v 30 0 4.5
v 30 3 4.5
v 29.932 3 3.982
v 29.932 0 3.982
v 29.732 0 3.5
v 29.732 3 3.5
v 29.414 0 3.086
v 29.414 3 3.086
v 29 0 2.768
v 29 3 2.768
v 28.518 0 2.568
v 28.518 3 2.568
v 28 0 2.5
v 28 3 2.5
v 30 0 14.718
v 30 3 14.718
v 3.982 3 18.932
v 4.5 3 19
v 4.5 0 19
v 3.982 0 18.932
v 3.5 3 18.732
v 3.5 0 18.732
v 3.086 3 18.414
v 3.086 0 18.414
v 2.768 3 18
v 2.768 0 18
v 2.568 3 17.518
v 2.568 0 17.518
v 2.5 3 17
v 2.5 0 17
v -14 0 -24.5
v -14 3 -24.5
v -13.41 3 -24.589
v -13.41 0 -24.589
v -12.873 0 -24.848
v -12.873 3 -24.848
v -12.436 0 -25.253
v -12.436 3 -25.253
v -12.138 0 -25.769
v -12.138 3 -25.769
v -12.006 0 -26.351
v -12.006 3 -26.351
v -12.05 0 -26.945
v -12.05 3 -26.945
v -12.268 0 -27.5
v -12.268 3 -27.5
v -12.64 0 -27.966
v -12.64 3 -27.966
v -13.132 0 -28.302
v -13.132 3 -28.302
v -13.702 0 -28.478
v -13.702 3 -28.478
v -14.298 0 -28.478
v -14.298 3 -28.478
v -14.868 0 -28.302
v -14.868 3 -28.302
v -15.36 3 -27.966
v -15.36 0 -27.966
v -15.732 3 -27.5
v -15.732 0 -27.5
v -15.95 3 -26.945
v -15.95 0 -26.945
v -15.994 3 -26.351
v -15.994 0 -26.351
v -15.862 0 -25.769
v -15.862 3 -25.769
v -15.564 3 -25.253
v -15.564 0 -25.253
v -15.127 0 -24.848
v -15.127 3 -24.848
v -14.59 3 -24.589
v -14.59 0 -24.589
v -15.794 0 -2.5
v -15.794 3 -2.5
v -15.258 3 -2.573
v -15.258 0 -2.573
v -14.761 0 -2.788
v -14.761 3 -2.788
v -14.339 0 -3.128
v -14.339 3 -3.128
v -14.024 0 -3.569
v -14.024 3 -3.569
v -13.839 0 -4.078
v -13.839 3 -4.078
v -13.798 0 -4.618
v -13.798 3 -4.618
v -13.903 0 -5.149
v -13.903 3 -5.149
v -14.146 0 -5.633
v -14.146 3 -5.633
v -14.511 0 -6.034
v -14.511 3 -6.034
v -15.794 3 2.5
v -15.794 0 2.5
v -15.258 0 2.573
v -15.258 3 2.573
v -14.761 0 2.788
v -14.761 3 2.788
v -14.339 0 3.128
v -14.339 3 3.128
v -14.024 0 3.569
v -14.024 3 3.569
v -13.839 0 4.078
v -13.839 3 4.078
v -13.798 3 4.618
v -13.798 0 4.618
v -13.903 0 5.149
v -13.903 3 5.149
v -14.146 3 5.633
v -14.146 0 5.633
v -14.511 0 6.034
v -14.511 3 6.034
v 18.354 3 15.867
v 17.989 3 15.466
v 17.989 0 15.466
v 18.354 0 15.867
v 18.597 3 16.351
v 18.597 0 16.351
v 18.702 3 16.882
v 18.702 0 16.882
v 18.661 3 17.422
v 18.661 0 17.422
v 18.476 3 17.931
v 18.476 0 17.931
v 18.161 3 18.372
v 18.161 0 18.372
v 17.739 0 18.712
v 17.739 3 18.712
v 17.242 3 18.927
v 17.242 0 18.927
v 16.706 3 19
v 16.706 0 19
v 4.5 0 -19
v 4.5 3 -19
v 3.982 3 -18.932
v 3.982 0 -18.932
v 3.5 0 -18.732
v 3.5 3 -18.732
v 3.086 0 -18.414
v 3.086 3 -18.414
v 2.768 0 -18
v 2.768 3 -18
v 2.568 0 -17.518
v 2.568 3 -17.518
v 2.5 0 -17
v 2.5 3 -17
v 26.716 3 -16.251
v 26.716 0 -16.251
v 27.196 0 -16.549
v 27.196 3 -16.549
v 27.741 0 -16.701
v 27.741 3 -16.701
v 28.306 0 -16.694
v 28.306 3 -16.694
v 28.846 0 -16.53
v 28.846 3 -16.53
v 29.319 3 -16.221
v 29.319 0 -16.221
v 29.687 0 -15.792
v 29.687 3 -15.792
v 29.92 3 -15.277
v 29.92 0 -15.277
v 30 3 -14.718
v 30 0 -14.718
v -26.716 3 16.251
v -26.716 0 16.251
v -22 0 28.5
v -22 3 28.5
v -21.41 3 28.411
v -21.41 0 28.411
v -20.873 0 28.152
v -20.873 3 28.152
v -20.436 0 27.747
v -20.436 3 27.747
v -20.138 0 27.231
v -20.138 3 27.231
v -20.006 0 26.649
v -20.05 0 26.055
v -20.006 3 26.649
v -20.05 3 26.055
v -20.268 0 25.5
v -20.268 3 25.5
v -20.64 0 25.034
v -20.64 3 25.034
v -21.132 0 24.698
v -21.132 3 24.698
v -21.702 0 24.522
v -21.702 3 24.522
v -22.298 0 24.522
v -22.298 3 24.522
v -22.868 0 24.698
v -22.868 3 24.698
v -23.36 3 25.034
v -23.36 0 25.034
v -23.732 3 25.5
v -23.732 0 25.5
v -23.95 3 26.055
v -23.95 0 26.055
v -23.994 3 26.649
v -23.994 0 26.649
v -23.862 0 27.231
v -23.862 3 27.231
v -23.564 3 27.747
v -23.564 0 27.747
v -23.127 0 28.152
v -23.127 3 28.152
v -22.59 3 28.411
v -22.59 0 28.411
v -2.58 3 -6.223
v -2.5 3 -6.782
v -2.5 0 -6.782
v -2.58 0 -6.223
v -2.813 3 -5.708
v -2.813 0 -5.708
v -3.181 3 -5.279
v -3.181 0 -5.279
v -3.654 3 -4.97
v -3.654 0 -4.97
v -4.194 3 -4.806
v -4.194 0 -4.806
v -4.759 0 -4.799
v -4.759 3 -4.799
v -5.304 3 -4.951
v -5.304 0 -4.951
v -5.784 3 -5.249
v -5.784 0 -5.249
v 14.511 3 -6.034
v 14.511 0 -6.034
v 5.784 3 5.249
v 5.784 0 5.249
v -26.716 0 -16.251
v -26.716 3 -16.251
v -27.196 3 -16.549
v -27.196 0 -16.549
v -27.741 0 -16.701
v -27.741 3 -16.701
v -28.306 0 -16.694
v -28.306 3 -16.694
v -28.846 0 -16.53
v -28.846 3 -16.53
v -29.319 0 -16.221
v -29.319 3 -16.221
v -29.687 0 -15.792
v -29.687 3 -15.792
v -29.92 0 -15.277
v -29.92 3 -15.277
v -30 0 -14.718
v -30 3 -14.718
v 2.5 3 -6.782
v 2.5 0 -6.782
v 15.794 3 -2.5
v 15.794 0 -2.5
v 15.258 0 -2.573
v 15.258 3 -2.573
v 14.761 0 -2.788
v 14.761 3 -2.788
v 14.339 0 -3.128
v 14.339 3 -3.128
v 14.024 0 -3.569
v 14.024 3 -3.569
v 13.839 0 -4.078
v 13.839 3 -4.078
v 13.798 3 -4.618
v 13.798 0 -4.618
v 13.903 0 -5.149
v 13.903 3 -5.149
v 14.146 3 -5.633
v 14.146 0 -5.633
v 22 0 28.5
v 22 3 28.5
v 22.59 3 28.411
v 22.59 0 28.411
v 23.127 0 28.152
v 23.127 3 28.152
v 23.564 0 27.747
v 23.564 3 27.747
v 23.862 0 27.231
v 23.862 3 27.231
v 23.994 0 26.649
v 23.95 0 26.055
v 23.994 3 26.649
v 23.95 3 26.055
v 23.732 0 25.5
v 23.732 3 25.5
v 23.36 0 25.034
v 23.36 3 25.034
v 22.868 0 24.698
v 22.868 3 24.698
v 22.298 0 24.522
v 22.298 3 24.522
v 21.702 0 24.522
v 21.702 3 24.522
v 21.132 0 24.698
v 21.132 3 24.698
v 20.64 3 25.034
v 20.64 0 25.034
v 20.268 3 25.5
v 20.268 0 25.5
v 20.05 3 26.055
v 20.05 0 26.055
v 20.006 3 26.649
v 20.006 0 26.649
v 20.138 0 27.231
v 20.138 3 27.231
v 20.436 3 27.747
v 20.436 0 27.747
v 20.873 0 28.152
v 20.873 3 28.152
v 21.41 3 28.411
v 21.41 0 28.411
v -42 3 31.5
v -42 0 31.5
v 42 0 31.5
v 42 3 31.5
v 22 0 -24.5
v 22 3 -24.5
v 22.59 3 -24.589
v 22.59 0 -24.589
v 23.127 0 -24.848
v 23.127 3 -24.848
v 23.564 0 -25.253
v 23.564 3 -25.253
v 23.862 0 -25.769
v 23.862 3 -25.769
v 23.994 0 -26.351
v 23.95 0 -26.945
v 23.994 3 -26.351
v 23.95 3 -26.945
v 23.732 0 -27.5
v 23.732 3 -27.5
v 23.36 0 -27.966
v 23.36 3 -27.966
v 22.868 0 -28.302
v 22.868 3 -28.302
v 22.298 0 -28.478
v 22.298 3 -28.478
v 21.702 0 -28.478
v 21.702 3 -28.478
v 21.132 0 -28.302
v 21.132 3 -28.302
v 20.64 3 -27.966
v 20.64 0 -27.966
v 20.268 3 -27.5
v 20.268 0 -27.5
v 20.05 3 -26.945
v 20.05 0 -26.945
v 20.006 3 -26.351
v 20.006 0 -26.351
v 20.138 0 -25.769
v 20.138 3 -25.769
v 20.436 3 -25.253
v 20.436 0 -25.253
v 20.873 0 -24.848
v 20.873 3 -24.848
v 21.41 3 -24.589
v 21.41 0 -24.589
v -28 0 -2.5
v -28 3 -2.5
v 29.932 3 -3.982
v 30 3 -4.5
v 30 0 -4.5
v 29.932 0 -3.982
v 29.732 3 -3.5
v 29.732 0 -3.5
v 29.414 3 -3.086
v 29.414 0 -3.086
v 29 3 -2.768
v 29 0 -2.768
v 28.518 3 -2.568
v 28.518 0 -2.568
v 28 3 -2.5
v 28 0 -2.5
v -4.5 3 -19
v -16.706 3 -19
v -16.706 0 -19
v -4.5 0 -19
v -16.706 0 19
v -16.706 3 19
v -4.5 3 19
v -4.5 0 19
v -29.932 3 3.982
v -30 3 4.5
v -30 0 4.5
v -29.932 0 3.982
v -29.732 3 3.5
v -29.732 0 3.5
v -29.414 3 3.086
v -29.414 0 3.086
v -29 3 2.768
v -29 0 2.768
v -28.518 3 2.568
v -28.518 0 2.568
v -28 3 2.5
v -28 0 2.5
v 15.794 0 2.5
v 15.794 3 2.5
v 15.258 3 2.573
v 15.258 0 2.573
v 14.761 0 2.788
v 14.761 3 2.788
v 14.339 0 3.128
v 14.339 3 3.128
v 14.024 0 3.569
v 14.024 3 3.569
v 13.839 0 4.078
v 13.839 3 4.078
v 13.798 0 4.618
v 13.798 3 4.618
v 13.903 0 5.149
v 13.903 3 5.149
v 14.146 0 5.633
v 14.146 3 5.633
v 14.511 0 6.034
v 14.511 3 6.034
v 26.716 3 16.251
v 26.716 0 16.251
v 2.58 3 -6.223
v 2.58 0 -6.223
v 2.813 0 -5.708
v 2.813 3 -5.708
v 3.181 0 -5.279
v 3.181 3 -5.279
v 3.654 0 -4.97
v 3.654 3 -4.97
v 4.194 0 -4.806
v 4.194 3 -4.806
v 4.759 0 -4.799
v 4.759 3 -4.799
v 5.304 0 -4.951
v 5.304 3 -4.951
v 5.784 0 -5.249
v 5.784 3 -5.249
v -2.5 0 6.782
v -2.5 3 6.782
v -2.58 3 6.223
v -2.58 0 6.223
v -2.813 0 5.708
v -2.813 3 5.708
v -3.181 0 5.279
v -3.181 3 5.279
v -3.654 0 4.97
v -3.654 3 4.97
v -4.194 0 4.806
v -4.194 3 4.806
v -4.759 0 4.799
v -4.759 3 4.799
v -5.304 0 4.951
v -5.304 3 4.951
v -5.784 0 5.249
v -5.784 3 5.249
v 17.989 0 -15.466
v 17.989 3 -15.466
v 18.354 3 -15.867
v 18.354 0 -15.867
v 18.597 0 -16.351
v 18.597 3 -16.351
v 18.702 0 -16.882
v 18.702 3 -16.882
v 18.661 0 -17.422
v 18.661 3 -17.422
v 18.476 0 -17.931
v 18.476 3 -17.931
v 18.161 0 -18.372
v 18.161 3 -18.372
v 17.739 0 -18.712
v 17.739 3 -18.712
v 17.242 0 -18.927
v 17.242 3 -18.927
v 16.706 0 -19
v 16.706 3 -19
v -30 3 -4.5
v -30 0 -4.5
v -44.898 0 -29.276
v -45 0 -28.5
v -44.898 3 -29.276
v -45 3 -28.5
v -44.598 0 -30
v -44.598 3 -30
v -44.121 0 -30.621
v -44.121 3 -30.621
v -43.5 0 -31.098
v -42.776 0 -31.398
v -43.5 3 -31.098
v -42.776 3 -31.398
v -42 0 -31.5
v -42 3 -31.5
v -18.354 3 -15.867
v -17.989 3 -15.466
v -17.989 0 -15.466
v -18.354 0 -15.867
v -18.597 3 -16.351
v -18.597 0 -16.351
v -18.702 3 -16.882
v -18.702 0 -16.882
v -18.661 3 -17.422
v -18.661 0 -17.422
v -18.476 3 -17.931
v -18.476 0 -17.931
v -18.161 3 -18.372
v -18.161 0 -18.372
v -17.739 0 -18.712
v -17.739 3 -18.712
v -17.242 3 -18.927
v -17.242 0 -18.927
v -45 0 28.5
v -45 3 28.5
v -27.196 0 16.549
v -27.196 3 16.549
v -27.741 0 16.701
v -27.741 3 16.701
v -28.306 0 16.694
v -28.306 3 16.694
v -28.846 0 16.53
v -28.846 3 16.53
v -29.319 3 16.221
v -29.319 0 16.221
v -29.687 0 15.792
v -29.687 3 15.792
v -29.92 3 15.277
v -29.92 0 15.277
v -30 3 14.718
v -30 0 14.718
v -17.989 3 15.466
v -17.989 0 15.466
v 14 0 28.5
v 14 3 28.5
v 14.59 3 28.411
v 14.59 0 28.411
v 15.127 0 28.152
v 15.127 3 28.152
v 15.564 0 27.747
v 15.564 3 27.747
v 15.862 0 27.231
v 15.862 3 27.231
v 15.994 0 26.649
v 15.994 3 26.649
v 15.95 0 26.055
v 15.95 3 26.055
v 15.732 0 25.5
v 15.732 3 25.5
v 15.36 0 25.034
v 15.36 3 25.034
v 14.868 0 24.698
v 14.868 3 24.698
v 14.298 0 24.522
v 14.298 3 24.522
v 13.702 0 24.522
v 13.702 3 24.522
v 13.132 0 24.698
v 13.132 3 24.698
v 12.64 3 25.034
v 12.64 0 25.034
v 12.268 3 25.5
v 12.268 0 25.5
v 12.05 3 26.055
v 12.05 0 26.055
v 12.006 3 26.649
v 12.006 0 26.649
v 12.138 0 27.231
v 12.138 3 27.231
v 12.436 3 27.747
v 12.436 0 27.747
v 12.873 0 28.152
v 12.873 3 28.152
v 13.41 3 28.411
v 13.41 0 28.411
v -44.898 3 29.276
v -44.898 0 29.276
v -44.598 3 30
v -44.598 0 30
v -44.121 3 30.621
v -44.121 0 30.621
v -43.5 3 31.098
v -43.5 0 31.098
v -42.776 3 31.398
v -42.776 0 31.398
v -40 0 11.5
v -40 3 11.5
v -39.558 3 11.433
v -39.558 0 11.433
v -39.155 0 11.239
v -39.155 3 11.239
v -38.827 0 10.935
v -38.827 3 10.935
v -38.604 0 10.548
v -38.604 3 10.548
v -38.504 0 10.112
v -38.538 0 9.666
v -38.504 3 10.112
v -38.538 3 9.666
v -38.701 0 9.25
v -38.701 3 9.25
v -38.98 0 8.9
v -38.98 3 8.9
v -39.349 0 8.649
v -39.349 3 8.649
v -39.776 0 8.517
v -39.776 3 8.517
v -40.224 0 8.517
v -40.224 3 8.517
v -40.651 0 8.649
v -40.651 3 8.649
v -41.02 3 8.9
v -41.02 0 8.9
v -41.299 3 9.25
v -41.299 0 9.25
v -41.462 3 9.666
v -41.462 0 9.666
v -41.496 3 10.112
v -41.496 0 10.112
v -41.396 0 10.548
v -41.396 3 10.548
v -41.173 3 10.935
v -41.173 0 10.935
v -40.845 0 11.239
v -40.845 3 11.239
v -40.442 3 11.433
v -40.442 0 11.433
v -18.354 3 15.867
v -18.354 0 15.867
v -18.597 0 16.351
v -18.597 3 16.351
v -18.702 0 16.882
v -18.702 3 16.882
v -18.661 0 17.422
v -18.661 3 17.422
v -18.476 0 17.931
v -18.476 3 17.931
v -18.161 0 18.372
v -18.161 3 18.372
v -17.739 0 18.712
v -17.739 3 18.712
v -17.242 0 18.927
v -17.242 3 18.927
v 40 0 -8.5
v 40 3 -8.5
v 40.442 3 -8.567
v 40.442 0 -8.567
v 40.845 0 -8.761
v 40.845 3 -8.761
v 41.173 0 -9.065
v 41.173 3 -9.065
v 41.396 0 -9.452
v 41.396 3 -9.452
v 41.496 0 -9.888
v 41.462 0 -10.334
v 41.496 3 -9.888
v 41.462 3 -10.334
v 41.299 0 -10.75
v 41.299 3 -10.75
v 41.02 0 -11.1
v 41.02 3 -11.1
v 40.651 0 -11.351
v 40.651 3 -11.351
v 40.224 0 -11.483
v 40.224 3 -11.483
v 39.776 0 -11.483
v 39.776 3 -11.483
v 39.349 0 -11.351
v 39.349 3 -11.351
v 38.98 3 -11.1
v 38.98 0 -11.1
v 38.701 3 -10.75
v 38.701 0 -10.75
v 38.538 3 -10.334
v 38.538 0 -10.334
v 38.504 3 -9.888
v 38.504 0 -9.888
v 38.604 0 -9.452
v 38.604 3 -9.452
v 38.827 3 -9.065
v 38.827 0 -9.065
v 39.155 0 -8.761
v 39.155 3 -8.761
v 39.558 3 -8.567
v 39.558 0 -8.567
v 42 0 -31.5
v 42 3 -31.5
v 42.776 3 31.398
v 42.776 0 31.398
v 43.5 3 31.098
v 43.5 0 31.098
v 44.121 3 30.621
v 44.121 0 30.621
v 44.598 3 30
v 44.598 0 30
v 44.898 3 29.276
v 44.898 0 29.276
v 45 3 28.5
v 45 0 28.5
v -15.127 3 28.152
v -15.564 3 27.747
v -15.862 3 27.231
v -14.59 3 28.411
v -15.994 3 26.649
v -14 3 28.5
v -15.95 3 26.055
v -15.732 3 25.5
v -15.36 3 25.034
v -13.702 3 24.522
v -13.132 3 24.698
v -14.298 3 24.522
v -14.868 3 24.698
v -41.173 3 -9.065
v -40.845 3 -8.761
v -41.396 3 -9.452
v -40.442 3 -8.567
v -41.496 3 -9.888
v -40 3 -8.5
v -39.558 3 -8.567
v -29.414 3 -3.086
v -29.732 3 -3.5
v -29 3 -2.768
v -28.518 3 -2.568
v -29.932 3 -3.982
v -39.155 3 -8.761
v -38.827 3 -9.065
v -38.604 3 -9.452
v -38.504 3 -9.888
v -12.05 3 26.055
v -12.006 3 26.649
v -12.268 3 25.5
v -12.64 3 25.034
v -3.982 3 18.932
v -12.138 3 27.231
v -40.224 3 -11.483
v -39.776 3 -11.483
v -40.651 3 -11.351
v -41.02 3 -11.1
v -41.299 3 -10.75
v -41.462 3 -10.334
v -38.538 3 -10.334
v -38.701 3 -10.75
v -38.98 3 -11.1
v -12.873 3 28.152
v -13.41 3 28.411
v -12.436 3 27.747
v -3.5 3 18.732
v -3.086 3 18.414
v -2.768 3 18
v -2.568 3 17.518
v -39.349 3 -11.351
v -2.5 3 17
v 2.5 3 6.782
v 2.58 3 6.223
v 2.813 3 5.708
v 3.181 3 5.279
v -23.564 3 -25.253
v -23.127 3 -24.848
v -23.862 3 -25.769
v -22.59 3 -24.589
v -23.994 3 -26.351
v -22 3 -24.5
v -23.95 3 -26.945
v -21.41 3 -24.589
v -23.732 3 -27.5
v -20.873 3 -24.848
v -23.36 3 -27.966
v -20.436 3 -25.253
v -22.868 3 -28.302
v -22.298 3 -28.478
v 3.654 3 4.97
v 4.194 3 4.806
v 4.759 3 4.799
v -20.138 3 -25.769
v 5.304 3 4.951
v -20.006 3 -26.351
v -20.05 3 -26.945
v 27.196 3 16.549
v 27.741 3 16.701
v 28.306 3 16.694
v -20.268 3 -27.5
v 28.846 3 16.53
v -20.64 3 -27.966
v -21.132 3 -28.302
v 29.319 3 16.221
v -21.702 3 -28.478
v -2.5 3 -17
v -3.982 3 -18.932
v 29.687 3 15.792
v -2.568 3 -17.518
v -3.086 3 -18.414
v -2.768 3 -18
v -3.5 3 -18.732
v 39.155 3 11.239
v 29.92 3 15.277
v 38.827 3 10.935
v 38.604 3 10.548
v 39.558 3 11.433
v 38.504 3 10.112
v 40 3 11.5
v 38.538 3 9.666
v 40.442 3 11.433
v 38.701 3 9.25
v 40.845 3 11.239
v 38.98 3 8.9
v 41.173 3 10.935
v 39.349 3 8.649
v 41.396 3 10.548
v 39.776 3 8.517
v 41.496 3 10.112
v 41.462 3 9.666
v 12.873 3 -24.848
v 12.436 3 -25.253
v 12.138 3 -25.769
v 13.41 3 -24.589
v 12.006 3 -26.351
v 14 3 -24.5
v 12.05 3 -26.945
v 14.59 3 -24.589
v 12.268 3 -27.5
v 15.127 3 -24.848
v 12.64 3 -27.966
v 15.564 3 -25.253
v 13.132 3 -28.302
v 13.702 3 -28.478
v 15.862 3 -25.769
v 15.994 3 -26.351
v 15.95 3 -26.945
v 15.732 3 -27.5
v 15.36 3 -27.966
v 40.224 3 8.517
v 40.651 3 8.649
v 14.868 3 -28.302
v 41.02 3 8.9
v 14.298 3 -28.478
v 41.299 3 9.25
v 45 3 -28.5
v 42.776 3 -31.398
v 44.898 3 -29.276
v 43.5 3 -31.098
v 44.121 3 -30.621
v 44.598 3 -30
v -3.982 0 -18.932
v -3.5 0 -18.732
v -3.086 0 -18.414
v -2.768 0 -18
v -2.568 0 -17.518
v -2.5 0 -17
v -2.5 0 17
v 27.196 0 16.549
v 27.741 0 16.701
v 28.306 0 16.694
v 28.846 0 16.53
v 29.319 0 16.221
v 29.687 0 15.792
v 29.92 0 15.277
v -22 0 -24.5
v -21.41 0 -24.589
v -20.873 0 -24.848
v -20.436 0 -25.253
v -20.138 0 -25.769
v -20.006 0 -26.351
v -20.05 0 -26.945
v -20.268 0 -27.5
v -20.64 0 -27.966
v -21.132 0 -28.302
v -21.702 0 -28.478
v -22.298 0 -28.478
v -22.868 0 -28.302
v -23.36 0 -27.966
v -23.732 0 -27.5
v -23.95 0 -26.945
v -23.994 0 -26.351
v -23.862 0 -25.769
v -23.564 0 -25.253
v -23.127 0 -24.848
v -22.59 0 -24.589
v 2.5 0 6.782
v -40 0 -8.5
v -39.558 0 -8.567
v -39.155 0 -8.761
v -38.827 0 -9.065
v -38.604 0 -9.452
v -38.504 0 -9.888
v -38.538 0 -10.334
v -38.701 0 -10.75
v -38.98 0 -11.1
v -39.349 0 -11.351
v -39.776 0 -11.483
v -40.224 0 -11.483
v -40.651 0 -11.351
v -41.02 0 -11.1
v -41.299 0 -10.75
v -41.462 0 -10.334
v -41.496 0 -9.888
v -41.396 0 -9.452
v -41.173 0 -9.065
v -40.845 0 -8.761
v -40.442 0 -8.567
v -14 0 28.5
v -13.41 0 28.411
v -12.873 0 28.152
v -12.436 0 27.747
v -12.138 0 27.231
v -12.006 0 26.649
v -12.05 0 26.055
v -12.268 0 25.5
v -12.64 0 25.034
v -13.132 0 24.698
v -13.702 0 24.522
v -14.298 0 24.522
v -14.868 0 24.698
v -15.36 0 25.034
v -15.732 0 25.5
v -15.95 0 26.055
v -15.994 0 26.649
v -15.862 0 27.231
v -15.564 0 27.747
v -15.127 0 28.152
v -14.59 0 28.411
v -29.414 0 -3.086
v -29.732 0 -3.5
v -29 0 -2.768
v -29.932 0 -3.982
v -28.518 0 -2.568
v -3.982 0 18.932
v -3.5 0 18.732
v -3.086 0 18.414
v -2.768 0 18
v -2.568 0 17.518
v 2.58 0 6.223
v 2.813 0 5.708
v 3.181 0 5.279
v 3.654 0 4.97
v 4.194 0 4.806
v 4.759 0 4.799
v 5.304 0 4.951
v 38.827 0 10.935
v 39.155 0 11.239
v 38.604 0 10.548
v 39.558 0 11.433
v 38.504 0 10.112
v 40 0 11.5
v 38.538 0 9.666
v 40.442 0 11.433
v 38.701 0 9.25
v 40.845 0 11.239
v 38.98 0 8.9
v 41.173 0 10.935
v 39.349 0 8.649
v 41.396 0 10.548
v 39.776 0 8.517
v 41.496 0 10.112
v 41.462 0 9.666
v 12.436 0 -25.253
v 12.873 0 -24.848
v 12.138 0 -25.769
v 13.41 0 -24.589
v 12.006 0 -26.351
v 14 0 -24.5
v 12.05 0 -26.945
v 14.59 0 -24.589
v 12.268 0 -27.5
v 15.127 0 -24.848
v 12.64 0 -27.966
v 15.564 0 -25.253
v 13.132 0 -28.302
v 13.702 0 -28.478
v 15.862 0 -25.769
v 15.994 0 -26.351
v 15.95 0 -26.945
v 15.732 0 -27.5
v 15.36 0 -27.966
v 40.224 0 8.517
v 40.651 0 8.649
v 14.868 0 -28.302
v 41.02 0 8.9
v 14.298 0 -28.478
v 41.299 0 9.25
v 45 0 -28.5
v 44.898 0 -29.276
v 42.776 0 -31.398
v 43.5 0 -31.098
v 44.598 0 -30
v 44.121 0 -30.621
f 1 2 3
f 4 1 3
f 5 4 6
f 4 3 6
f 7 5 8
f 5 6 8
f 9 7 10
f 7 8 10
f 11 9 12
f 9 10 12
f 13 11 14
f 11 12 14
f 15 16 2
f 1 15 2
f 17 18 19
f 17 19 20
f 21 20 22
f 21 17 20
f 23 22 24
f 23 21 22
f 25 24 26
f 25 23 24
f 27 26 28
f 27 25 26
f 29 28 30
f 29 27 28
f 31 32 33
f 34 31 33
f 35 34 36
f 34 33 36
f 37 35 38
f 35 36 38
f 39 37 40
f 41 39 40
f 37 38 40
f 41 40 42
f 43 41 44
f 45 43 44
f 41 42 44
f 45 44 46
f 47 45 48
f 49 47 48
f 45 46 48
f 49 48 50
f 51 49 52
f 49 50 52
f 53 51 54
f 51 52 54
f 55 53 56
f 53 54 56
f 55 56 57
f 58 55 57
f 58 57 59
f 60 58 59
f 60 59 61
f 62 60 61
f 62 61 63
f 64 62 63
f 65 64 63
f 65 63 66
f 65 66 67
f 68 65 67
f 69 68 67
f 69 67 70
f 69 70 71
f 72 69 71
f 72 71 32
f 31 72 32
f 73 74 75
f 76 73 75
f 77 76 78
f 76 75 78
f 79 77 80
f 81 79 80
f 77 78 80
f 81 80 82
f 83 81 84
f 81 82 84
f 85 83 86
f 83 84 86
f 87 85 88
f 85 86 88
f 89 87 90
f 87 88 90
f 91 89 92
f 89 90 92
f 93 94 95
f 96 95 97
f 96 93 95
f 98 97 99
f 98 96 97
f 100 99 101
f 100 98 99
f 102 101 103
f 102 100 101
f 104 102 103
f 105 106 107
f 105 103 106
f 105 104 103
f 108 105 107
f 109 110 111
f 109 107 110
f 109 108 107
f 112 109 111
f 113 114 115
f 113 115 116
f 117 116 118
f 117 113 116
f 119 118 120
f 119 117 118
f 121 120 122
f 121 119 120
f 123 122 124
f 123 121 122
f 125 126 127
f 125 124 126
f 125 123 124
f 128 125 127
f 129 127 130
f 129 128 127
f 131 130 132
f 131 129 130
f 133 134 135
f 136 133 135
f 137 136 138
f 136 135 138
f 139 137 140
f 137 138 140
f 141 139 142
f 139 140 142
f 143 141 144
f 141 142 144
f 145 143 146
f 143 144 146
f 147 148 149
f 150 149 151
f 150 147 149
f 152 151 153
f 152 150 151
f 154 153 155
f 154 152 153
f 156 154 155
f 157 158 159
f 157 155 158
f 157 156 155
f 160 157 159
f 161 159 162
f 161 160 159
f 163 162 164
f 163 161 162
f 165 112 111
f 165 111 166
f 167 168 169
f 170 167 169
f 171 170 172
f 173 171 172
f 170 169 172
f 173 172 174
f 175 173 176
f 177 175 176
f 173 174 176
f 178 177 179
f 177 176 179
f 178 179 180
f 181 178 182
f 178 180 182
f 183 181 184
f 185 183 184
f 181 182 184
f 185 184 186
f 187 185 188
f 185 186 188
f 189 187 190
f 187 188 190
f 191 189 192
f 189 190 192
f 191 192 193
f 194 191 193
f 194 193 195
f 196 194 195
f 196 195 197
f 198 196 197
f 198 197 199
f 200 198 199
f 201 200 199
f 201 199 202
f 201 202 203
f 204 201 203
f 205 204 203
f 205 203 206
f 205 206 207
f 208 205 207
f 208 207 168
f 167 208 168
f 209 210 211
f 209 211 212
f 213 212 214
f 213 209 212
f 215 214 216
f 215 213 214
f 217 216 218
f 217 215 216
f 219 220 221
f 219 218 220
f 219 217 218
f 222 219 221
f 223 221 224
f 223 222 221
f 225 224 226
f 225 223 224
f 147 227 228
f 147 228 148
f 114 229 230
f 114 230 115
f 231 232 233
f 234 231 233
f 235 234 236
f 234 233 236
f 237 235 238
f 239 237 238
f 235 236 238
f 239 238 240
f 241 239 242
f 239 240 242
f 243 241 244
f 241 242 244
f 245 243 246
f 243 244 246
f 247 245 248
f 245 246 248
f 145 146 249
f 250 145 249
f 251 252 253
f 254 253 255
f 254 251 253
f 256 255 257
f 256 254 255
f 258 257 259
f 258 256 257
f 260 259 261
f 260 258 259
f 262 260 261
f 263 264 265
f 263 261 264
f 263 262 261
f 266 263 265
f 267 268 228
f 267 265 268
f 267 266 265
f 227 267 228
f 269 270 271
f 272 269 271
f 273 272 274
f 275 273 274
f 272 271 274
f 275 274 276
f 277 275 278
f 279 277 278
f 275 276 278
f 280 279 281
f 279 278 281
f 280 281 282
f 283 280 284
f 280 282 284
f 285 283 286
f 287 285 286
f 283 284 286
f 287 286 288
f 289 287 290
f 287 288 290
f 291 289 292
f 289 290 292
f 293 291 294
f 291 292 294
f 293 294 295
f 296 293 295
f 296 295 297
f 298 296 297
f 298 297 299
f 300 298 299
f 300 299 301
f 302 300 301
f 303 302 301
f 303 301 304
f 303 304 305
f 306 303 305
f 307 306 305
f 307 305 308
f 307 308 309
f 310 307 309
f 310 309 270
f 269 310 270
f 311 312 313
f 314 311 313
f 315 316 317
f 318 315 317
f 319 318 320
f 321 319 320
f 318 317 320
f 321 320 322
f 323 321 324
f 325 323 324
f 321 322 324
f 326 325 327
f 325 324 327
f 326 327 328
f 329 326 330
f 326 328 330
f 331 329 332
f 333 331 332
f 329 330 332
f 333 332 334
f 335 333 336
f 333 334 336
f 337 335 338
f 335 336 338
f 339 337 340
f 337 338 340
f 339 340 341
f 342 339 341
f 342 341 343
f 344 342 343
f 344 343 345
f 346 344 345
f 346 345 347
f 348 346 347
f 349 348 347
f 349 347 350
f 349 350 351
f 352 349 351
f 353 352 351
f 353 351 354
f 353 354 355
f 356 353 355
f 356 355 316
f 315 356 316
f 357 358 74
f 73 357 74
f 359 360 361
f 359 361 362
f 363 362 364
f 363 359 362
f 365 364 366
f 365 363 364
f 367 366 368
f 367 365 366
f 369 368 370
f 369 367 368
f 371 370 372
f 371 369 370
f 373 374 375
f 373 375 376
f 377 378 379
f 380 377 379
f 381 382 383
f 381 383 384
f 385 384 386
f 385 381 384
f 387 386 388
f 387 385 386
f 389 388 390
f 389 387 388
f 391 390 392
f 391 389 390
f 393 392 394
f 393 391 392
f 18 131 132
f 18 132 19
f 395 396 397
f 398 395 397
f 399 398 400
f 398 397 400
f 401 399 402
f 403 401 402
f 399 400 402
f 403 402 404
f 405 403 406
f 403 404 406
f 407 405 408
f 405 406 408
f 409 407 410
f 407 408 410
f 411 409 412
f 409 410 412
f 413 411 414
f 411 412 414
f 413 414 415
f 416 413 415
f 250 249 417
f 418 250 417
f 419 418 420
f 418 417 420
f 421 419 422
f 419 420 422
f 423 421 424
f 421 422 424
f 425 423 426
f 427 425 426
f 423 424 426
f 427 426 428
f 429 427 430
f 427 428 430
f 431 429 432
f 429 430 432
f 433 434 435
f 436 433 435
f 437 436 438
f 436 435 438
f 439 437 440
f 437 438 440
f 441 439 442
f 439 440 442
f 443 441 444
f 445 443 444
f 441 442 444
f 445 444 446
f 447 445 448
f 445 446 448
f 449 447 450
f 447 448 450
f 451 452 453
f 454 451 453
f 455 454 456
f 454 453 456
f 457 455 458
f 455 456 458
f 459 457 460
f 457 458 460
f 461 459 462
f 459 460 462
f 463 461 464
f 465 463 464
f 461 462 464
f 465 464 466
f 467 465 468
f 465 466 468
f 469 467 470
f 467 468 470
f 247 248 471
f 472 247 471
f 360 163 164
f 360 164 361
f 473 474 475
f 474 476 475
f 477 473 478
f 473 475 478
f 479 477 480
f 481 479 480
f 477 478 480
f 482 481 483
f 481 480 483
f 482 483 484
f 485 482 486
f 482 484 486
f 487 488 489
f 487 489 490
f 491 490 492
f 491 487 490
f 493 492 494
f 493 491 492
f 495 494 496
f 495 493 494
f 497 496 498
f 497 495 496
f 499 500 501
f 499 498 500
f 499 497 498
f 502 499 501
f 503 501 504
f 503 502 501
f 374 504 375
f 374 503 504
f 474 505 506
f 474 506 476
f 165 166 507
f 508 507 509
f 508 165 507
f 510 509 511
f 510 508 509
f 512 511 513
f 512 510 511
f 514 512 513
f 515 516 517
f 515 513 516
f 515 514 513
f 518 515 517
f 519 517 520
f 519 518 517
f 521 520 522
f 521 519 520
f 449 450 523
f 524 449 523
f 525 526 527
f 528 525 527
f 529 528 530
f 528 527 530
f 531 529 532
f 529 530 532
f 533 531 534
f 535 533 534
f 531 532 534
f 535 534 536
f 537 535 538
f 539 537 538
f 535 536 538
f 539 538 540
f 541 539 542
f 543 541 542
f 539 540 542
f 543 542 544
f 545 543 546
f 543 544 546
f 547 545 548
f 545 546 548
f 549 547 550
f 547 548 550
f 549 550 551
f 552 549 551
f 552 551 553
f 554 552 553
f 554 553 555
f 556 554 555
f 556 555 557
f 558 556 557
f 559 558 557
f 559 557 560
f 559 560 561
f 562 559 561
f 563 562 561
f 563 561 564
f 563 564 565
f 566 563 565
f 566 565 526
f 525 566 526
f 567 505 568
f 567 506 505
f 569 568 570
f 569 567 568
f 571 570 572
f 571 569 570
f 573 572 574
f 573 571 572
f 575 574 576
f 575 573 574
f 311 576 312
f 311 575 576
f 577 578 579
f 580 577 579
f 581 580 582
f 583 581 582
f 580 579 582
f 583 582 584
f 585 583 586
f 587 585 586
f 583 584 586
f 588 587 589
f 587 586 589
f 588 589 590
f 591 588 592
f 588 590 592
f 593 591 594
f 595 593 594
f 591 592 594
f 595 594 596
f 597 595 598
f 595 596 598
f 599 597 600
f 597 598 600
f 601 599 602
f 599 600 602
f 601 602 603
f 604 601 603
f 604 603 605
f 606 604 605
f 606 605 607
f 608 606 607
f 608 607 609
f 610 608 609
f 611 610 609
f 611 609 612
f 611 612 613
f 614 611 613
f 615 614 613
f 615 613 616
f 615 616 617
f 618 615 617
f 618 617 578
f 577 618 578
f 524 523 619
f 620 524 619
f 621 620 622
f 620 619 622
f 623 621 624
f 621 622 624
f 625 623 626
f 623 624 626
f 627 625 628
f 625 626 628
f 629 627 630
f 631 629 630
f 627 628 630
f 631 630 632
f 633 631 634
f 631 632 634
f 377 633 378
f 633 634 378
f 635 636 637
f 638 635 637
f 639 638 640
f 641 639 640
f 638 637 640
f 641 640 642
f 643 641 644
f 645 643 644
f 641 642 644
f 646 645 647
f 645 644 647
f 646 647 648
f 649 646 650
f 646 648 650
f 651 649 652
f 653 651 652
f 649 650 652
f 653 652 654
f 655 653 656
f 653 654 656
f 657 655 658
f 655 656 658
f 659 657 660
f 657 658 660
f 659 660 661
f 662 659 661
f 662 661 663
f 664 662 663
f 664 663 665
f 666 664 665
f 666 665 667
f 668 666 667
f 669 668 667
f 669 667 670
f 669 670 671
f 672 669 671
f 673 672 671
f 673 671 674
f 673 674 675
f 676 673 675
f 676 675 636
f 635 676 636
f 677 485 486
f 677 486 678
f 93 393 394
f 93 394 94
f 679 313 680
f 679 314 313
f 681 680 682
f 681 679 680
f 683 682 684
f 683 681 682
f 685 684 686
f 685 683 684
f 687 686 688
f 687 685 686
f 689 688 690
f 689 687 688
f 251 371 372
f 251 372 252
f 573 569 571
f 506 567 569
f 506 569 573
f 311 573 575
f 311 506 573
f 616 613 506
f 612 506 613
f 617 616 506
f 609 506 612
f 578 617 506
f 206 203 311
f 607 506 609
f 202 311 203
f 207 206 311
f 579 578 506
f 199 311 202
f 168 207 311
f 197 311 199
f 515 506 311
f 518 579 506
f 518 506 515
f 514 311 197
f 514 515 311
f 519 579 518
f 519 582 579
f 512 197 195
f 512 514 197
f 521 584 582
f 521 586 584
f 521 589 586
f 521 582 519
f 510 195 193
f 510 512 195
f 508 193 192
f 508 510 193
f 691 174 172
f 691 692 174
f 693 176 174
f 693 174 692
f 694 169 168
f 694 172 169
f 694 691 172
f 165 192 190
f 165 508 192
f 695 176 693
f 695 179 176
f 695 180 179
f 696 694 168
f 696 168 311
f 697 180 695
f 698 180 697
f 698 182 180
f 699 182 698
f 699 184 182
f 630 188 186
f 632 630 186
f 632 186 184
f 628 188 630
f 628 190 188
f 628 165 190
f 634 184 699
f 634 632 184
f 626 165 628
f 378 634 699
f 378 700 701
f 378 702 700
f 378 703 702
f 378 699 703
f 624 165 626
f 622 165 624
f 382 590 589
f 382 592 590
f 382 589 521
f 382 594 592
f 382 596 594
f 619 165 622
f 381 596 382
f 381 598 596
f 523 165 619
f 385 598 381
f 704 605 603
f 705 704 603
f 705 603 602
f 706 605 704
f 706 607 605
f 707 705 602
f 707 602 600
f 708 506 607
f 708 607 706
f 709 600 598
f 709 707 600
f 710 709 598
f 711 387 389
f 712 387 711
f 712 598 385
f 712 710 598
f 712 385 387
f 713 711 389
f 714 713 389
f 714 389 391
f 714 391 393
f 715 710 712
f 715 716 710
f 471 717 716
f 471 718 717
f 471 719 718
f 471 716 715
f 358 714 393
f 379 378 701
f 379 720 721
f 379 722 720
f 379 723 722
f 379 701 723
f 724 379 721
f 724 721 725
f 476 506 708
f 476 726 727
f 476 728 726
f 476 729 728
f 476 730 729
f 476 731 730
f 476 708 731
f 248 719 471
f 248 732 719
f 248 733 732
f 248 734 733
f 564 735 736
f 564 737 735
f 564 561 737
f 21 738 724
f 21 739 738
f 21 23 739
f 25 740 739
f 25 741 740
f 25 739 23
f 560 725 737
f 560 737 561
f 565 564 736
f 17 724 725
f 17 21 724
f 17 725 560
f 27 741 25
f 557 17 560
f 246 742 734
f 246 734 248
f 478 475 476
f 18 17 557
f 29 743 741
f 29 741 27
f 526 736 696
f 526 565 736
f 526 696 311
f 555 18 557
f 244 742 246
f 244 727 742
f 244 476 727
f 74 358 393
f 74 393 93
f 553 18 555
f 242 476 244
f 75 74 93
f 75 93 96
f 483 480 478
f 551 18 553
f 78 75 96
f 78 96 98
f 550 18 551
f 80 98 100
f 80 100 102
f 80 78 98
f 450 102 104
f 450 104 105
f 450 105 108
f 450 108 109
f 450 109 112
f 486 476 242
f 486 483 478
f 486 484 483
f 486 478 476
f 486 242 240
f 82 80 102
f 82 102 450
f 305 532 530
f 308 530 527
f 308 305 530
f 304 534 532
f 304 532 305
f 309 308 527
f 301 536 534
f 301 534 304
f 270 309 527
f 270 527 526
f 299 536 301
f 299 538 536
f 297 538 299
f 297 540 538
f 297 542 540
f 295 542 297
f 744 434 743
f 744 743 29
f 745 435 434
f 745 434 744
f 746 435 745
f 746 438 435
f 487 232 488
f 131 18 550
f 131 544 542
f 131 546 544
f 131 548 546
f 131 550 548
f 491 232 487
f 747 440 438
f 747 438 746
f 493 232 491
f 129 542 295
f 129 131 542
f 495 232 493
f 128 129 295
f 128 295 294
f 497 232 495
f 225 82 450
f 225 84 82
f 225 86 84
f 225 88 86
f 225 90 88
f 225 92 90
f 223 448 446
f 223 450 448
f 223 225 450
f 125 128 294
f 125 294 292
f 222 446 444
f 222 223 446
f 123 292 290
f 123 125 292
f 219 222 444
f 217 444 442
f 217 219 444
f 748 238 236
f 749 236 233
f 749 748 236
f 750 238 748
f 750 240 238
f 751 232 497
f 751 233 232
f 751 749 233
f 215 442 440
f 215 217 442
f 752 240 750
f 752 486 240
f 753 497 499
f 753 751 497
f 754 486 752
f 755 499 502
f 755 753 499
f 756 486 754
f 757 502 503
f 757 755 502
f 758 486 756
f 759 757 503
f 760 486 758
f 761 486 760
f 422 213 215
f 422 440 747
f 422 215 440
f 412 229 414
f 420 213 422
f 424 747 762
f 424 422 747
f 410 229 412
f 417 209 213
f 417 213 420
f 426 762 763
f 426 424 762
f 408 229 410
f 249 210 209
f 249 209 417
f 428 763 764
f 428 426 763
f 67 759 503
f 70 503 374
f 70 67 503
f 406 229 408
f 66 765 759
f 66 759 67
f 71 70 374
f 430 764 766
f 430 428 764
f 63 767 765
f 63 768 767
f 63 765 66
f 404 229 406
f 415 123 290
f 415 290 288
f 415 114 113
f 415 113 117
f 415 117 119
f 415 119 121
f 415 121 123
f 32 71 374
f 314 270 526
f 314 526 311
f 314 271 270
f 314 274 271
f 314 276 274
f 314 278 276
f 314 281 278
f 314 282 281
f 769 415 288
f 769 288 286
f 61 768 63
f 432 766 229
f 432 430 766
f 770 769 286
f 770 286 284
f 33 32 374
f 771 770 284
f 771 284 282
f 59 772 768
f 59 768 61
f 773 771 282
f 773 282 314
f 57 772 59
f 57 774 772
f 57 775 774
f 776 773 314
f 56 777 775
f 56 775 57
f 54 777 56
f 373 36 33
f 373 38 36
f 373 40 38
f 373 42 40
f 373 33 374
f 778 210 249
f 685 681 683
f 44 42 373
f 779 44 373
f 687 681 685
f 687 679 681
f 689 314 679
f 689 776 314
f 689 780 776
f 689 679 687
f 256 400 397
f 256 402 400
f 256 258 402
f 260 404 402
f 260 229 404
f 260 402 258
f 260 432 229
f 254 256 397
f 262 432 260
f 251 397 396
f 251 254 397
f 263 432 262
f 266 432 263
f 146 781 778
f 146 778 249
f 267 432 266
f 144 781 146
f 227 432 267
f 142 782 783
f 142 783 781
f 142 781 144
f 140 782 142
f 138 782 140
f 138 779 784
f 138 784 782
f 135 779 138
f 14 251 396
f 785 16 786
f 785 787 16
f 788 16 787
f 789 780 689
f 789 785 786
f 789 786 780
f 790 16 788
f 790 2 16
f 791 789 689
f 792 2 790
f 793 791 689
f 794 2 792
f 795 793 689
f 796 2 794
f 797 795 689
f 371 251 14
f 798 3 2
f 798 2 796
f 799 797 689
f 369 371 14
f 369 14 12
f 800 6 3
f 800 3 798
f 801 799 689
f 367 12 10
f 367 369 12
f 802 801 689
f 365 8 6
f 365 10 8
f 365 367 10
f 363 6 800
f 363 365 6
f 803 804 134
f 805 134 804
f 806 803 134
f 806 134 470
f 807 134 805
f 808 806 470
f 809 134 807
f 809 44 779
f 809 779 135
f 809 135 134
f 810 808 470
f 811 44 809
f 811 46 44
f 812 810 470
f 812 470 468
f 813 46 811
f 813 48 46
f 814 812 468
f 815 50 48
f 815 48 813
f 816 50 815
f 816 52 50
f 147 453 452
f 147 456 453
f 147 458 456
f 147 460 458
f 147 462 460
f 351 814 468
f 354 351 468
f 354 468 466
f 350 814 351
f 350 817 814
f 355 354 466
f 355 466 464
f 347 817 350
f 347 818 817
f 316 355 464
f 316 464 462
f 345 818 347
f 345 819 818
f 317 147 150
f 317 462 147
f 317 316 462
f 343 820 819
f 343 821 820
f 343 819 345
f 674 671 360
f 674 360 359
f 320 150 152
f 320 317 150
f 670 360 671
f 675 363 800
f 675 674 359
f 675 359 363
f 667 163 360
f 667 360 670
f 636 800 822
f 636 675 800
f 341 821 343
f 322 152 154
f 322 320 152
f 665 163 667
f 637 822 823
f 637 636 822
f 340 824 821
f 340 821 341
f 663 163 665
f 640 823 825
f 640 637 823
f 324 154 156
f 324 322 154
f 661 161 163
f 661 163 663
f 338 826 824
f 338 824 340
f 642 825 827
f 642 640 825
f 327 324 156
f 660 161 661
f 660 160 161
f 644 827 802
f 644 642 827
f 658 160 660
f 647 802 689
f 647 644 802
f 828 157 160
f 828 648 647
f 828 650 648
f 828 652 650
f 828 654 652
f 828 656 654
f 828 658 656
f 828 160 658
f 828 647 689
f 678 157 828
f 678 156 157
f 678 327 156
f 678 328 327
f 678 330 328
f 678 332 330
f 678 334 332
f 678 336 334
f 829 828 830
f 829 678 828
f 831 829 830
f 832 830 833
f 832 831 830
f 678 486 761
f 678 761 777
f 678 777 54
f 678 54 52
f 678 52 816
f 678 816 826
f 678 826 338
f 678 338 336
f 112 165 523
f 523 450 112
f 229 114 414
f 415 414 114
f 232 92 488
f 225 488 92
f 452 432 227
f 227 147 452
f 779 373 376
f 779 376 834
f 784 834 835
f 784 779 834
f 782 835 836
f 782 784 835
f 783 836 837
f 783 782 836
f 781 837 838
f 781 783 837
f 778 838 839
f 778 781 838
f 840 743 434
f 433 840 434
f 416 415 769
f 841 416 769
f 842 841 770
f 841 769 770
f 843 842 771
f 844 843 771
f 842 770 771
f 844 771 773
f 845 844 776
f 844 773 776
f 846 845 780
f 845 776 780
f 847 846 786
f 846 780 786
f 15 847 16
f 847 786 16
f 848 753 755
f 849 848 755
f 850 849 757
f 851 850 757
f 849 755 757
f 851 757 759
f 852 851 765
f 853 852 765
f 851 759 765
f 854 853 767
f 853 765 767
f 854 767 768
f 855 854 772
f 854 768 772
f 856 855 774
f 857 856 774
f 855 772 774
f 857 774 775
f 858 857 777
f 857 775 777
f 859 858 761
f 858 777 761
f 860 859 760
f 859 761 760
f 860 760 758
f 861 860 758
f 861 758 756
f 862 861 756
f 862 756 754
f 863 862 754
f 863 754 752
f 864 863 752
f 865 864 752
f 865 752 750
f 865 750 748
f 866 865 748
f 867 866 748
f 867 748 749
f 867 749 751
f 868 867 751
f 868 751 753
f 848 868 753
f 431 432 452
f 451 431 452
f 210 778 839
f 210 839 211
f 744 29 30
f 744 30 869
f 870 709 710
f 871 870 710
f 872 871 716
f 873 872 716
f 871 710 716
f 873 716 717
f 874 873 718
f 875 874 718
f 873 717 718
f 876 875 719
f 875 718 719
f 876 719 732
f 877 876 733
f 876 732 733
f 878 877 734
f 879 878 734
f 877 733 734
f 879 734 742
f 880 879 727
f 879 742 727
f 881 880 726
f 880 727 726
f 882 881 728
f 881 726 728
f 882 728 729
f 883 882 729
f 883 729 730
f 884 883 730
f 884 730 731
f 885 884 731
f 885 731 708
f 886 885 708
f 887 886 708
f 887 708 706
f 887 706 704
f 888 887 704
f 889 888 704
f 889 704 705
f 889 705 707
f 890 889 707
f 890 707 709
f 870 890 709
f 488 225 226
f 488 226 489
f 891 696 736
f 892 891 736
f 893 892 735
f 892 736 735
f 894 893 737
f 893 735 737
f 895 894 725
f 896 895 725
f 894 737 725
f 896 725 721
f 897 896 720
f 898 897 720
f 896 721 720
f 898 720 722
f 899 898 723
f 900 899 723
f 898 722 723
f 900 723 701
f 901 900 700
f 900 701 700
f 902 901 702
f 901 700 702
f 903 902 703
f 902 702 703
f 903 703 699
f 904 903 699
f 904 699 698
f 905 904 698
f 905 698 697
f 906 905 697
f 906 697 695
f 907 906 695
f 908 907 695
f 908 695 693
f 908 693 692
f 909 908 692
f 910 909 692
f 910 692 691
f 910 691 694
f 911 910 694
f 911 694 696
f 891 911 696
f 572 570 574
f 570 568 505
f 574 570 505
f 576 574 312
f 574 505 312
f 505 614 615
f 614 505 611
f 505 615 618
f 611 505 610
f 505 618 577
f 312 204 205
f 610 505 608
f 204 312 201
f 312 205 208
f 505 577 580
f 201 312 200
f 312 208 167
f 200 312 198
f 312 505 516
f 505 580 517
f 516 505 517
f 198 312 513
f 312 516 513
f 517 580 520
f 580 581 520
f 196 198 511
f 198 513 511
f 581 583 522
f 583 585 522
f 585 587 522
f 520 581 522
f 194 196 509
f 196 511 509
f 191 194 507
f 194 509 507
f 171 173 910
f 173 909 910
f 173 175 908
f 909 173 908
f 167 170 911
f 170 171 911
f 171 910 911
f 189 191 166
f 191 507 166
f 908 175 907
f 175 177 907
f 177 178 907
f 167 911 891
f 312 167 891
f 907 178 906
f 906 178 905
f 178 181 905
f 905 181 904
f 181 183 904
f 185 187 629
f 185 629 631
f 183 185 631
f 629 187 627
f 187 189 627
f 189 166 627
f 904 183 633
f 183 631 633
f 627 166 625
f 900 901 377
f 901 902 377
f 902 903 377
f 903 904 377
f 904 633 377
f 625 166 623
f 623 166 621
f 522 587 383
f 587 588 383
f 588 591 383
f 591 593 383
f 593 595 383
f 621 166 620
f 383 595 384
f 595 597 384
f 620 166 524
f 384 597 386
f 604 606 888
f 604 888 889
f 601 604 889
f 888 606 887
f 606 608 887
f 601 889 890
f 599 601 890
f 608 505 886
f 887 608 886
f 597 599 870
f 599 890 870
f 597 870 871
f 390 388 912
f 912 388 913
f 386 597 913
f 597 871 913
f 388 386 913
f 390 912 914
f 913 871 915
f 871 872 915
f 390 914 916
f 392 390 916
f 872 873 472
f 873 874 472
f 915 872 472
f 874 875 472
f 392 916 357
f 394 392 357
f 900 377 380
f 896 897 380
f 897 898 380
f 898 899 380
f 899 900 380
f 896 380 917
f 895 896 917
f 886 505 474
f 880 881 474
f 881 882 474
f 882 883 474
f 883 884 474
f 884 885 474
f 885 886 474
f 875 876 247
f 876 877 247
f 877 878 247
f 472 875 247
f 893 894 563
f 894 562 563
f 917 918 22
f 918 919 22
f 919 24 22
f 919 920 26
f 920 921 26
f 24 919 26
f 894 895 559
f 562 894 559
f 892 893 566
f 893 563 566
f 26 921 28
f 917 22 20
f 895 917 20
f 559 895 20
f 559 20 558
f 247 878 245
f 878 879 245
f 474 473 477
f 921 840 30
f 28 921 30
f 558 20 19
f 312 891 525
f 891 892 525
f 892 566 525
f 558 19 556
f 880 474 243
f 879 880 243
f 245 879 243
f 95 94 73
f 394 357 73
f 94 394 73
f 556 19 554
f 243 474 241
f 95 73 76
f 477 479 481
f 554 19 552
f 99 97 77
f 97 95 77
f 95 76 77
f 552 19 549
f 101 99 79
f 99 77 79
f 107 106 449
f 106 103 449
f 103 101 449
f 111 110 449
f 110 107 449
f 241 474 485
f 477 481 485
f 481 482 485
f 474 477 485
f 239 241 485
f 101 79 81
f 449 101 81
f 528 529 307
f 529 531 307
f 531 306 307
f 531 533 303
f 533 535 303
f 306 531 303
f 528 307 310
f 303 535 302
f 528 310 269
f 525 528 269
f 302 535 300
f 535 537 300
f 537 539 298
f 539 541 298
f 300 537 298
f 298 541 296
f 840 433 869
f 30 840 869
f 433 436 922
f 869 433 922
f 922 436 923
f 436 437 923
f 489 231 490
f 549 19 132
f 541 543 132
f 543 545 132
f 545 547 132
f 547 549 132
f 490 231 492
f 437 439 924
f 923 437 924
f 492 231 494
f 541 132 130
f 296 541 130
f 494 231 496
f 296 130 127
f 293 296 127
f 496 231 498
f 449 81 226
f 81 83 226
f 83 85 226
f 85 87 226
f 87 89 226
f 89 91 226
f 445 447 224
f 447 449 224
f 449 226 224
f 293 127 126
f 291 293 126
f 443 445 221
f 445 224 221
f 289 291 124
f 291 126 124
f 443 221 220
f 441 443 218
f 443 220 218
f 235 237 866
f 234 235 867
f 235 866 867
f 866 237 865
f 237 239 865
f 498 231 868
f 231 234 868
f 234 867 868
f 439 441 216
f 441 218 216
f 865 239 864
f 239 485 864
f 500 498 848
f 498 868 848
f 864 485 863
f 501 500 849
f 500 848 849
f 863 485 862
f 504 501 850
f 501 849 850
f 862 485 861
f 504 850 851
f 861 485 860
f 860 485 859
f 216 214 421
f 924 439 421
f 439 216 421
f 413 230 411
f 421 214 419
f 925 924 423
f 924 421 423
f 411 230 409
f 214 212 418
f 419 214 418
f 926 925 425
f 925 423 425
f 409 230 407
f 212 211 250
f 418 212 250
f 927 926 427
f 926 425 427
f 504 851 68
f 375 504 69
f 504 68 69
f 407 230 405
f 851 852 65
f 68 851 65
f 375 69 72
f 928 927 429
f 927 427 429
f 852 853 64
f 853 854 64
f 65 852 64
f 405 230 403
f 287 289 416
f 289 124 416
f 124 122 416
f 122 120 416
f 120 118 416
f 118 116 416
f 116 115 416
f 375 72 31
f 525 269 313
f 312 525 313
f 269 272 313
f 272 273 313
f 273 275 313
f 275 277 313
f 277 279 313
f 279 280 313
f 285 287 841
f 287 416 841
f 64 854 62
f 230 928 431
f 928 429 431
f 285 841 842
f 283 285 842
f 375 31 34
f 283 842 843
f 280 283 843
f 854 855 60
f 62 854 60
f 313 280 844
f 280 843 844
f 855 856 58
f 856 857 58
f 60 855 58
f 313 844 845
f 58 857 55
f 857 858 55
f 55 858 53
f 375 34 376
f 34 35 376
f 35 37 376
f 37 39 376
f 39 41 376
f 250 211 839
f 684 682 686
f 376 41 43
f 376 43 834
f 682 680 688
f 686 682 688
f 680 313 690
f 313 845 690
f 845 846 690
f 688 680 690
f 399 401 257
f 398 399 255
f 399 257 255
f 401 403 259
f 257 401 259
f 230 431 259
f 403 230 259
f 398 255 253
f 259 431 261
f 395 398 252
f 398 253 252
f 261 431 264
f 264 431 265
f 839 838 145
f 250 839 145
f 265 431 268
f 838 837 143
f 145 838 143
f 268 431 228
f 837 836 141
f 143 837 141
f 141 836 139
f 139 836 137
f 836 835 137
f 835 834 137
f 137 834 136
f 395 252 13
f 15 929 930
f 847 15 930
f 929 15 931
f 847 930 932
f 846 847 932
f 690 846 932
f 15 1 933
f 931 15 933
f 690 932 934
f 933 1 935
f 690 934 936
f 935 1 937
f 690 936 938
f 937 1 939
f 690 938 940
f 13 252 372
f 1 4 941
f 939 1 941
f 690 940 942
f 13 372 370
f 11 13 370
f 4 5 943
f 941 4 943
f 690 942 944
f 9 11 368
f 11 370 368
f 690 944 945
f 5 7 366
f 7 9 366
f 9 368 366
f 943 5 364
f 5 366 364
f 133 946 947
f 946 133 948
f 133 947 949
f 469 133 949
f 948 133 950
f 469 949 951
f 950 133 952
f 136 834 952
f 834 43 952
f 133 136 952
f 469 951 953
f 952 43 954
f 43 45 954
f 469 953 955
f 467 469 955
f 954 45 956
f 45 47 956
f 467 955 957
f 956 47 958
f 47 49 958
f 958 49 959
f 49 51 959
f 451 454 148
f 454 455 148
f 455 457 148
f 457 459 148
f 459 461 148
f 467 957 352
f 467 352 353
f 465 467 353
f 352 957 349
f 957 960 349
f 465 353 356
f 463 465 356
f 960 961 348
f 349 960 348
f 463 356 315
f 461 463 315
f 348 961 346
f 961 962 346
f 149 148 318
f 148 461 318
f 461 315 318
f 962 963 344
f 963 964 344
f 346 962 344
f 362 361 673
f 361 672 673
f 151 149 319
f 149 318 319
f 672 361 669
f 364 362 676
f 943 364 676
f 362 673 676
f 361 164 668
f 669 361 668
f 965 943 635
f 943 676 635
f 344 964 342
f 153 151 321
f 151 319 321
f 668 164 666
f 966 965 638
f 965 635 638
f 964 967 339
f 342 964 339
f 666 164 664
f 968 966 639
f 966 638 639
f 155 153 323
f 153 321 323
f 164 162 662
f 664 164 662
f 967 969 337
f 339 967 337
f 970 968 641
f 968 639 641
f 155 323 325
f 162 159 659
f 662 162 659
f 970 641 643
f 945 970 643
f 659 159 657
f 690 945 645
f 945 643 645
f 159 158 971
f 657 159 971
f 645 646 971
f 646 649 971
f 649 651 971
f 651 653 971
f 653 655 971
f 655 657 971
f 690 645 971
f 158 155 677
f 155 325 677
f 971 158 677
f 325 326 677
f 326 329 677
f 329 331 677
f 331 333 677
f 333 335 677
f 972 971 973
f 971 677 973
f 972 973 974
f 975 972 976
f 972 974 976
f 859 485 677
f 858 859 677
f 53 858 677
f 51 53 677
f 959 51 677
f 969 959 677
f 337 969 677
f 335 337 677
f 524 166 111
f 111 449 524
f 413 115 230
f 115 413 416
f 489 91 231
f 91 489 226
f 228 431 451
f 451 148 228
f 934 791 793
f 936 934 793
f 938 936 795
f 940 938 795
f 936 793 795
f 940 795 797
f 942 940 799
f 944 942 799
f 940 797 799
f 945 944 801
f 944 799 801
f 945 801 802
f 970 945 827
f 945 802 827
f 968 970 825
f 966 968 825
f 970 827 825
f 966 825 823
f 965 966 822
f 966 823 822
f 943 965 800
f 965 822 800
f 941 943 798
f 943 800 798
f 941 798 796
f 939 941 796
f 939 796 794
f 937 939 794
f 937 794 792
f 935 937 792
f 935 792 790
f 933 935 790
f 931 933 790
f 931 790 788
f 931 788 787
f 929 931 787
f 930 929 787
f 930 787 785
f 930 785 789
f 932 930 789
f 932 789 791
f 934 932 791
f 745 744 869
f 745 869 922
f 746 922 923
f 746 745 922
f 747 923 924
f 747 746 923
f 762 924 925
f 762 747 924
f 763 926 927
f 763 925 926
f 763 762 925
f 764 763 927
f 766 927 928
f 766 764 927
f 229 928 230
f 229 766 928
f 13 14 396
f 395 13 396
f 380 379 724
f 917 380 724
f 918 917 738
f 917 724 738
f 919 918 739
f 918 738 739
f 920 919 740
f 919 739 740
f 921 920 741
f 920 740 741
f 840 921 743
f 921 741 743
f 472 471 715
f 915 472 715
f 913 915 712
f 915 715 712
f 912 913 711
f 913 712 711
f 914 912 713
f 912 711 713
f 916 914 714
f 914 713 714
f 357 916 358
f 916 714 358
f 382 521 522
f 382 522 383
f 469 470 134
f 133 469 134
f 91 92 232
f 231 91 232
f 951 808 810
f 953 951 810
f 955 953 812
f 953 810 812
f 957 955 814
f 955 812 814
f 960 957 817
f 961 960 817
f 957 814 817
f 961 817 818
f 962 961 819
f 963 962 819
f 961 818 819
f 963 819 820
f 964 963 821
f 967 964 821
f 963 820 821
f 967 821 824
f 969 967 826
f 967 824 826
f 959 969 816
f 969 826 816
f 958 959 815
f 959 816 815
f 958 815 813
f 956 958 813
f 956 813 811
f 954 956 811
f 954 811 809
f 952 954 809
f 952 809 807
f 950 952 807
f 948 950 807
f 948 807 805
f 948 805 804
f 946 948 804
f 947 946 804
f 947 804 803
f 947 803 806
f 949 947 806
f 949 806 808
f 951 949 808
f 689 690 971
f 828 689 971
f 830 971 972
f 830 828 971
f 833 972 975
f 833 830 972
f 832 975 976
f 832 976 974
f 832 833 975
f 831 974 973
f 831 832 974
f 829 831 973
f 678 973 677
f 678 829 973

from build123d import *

# Parameters (mm, degrees)
SKETCH_1_W          = 90
SKETCH_1_H          = 63
EXTRUDE_1_DEPTH     = 3
FILLET_1_R          = 3
SKETCH_2_R          = 1.5
SKETCH_2_R_2        = 2
CUT_EXTRUDE_1_DEPTH = 10
CUT_EXTRUDE_2_DEPTH = 10


with BuildPart() as part:
    # 草图1 → 凸台-拉伸1 (new body)
    with BuildSketch(Plane(origin=(0, 0, 0), x_dir=(1, 0, 0), z_dir=(0, 1, 0))):
        Rectangle(SKETCH_1_W, SKETCH_1_H)
    extrude(amount=EXTRUDE_1_DEPTH)

    # 圆角1
    fillet_1_edges = [part.edges().sort_by_distance(p)[0] for p in [
        (45, 1.5, 31.5),
        (-45, 1.5, 31.5),
        (-45, 1.5, -31.5),
        (45, 1.5, -31.5),
    ]]
    fillet(fillet_1_edges, radius=FILLET_1_R)

    # 草图2 → 切除-拉伸1 (cut)
    with BuildSketch(Plane(origin=(0, 3, 0), x_dir=(1, 0, 0), z_dir=(0, 1, 0))):
        with Locations(Location((-40, 10, 0), (0, 0, 270))):
            Circle(SKETCH_2_R)
        with Locations(Location((-40, -10, 0), (0, 0, 270))):
            Circle(SKETCH_2_R)
        with Locations(Location((40, -10, 0), (0, 0, 270))):
            Circle(SKETCH_2_R)
        with Locations(Location((40, 10, 0), (0, 0, 270))):
            Circle(SKETCH_2_R)
        with Locations(Location((-22, -26.5, 0), (0, 0, 270))):
            Circle(SKETCH_2_R_2)
        with Locations(Location((-14, -26.5, 0), (0, 0, 270))):
            Circle(SKETCH_2_R_2)
        with Locations(Location((14, -26.5, 0), (0, 0, 270))):
            Circle(SKETCH_2_R_2)
        with Locations(Location((22, -26.5, 0), (0, 0, 270))):
            Circle(SKETCH_2_R_2)
        with Locations(Location((22, 26.5, 0), (0, 0, 270))):
            Circle(SKETCH_2_R_2)
        with Locations(Location((14, 26.5, 0), (0, 0, 270))):
            Circle(SKETCH_2_R_2)
        with Locations(Location((-14, 26.5, 0), (0, 0, 270))):
            Circle(SKETCH_2_R_2)
        with Locations(Location((-22, 26.5, 0), (0, 0, 270))):
            Circle(SKETCH_2_R_2)
    extrude(amount=-CUT_EXTRUDE_1_DEPTH, mode=Mode.SUBTRACT)

    # 草图4 → 切除-拉伸2 (cut)
    with BuildSketch(Plane(origin=(0, 3, 0), x_dir=(1, 0, 0), z_dir=(0, 1, 0))):
        with BuildLine():
            Line((16.70561704, -19), (4.5, -19))
            ThreePointArc((4.5, -19), (3.085786438, -18.414213562), (2.5, -17))
            Line((2.5, -17), (2.5, -6.782494944))
            ThreePointArc((2.5, -6.782494944), (3.653707073, -4.970372354), (5.783788282, -5.248908414))
            Line((5.783788282, -5.248908414), (17.989405322, -15.466413469))
            ThreePointArc((17.989405322, -15.466413469), (18.585400679, -17.682944704), (16.70561704, -19))
        make_face()
        with BuildLine():
            Line((14.510594678, -6.033586531), (26.716211718, -16.251091586))
            ThreePointArc((26.716211718, -16.251091586), (28.846292927, -16.529627646), (30, -14.717505056))
            Line((30, -14.717505056), (30, -4.5))
            ThreePointArc((30, -4.5), (29.414213562, -3.085786438), (28, -2.5))
            Line((28, -2.5), (15.79438296, -2.5))
            ThreePointArc((15.79438296, -2.5), (13.914599321, -3.817055296), (14.510594678, -6.033586531))
        make_face()
        with BuildLine():
            Line((28, 2.5), (15.79438296, 2.5))
            ThreePointArc((15.79438296, 2.5), (13.914599321, 3.817055296), (14.510594678, 6.033586531))
            Line((14.510594678, 6.033586531), (26.716211718, 16.251091586))
            ThreePointArc((26.716211718, 16.251091586), (28.846292927, 16.529627646), (30, 14.717505056))
            Line((30, 14.717505056), (30, 4.5))
            ThreePointArc((30, 4.5), (29.414213562, 3.085786438), (28, 2.5))
        make_face()
        with BuildLine():
            Line((5.783788282, 5.248908414), (17.989405322, 15.466413469))
            ThreePointArc((17.989405322, 15.466413469), (18.585400679, 17.682944704), (16.70561704, 19))
            Line((16.70561704, 19), (4.5, 19))
            ThreePointArc((4.5, 19), (3.085786438, 18.414213562), (2.5, 17))
            Line((2.5, 17), (2.5, 6.782494944))
            ThreePointArc((2.5, 6.782494944), (3.653707073, 4.970372354), (5.783788282, 5.248908414))
        make_face()
        with BuildLine():
            Line((-16.70561704, 19), (-4.5, 19))
            ThreePointArc((-4.5, 19), (-3.085786438, 18.414213562), (-2.5, 17))
            Line((-2.5, 17), (-2.5, 6.782494944))
            ThreePointArc((-2.5, 6.782494944), (-3.653707073, 4.970372354), (-5.783788282, 5.248908414))
            Line((-5.783788282, 5.248908414), (-17.989405322, 15.466413469))
            ThreePointArc((-17.989405322, 15.466413469), (-18.585400679, 17.682944704), (-16.70561704, 19))
        make_face()
        with BuildLine():
            Line((-14.510594678, 6.033586531), (-26.716211718, 16.251091586))
            ThreePointArc((-26.716211718, 16.251091586), (-28.846292927, 16.529627646), (-30, 14.717505056))
            Line((-30, 14.717505056), (-30, 4.5))
            ThreePointArc((-30, 4.5), (-29.414213562, 3.085786438), (-28, 2.5))
            Line((-28, 2.5), (-15.79438296, 2.5))
            ThreePointArc((-15.79438296, 2.5), (-13.914599321, 3.817055296), (-14.510594678, 6.033586531))
        make_face()
        with BuildLine():
            Line((-28, -2.5), (-15.79438296, -2.5))
            ThreePointArc((-15.79438296, -2.5), (-13.914599321, -3.817055296), (-14.510594678, -6.033586531))
            Line((-14.510594678, -6.033586531), (-26.716211718, -16.251091586))
            ThreePointArc((-26.716211718, -16.251091586), (-28.846292927, -16.529627646), (-30, -14.717505056))
            Line((-30, -14.717505056), (-30, -4.5))
            ThreePointArc((-30, -4.5), (-29.414213562, -3.085786438), (-28, -2.5))
        make_face()
        with BuildLine():
            Line((-5.783788282, -5.248908414), (-17.989405322, -15.466413469))
            ThreePointArc((-17.989405322, -15.466413469), (-18.585400679, -17.682944704), (-16.70561704, -19))
            Line((-16.70561704, -19), (-4.5, -19))
            ThreePointArc((-4.5, -19), (-3.085786438, -18.414213562), (-2.5, -17))
            Line((-2.5, -17), (-2.5, -6.782494944))
            ThreePointArc((-2.5, -6.782494944), (-3.653707073, -4.970372354), (-5.783788282, -5.248908414))
        make_face()
    extrude(amount=-CUT_EXTRUDE_2_DEPTH, mode=Mode.SUBTRACT)


solid = part.part
